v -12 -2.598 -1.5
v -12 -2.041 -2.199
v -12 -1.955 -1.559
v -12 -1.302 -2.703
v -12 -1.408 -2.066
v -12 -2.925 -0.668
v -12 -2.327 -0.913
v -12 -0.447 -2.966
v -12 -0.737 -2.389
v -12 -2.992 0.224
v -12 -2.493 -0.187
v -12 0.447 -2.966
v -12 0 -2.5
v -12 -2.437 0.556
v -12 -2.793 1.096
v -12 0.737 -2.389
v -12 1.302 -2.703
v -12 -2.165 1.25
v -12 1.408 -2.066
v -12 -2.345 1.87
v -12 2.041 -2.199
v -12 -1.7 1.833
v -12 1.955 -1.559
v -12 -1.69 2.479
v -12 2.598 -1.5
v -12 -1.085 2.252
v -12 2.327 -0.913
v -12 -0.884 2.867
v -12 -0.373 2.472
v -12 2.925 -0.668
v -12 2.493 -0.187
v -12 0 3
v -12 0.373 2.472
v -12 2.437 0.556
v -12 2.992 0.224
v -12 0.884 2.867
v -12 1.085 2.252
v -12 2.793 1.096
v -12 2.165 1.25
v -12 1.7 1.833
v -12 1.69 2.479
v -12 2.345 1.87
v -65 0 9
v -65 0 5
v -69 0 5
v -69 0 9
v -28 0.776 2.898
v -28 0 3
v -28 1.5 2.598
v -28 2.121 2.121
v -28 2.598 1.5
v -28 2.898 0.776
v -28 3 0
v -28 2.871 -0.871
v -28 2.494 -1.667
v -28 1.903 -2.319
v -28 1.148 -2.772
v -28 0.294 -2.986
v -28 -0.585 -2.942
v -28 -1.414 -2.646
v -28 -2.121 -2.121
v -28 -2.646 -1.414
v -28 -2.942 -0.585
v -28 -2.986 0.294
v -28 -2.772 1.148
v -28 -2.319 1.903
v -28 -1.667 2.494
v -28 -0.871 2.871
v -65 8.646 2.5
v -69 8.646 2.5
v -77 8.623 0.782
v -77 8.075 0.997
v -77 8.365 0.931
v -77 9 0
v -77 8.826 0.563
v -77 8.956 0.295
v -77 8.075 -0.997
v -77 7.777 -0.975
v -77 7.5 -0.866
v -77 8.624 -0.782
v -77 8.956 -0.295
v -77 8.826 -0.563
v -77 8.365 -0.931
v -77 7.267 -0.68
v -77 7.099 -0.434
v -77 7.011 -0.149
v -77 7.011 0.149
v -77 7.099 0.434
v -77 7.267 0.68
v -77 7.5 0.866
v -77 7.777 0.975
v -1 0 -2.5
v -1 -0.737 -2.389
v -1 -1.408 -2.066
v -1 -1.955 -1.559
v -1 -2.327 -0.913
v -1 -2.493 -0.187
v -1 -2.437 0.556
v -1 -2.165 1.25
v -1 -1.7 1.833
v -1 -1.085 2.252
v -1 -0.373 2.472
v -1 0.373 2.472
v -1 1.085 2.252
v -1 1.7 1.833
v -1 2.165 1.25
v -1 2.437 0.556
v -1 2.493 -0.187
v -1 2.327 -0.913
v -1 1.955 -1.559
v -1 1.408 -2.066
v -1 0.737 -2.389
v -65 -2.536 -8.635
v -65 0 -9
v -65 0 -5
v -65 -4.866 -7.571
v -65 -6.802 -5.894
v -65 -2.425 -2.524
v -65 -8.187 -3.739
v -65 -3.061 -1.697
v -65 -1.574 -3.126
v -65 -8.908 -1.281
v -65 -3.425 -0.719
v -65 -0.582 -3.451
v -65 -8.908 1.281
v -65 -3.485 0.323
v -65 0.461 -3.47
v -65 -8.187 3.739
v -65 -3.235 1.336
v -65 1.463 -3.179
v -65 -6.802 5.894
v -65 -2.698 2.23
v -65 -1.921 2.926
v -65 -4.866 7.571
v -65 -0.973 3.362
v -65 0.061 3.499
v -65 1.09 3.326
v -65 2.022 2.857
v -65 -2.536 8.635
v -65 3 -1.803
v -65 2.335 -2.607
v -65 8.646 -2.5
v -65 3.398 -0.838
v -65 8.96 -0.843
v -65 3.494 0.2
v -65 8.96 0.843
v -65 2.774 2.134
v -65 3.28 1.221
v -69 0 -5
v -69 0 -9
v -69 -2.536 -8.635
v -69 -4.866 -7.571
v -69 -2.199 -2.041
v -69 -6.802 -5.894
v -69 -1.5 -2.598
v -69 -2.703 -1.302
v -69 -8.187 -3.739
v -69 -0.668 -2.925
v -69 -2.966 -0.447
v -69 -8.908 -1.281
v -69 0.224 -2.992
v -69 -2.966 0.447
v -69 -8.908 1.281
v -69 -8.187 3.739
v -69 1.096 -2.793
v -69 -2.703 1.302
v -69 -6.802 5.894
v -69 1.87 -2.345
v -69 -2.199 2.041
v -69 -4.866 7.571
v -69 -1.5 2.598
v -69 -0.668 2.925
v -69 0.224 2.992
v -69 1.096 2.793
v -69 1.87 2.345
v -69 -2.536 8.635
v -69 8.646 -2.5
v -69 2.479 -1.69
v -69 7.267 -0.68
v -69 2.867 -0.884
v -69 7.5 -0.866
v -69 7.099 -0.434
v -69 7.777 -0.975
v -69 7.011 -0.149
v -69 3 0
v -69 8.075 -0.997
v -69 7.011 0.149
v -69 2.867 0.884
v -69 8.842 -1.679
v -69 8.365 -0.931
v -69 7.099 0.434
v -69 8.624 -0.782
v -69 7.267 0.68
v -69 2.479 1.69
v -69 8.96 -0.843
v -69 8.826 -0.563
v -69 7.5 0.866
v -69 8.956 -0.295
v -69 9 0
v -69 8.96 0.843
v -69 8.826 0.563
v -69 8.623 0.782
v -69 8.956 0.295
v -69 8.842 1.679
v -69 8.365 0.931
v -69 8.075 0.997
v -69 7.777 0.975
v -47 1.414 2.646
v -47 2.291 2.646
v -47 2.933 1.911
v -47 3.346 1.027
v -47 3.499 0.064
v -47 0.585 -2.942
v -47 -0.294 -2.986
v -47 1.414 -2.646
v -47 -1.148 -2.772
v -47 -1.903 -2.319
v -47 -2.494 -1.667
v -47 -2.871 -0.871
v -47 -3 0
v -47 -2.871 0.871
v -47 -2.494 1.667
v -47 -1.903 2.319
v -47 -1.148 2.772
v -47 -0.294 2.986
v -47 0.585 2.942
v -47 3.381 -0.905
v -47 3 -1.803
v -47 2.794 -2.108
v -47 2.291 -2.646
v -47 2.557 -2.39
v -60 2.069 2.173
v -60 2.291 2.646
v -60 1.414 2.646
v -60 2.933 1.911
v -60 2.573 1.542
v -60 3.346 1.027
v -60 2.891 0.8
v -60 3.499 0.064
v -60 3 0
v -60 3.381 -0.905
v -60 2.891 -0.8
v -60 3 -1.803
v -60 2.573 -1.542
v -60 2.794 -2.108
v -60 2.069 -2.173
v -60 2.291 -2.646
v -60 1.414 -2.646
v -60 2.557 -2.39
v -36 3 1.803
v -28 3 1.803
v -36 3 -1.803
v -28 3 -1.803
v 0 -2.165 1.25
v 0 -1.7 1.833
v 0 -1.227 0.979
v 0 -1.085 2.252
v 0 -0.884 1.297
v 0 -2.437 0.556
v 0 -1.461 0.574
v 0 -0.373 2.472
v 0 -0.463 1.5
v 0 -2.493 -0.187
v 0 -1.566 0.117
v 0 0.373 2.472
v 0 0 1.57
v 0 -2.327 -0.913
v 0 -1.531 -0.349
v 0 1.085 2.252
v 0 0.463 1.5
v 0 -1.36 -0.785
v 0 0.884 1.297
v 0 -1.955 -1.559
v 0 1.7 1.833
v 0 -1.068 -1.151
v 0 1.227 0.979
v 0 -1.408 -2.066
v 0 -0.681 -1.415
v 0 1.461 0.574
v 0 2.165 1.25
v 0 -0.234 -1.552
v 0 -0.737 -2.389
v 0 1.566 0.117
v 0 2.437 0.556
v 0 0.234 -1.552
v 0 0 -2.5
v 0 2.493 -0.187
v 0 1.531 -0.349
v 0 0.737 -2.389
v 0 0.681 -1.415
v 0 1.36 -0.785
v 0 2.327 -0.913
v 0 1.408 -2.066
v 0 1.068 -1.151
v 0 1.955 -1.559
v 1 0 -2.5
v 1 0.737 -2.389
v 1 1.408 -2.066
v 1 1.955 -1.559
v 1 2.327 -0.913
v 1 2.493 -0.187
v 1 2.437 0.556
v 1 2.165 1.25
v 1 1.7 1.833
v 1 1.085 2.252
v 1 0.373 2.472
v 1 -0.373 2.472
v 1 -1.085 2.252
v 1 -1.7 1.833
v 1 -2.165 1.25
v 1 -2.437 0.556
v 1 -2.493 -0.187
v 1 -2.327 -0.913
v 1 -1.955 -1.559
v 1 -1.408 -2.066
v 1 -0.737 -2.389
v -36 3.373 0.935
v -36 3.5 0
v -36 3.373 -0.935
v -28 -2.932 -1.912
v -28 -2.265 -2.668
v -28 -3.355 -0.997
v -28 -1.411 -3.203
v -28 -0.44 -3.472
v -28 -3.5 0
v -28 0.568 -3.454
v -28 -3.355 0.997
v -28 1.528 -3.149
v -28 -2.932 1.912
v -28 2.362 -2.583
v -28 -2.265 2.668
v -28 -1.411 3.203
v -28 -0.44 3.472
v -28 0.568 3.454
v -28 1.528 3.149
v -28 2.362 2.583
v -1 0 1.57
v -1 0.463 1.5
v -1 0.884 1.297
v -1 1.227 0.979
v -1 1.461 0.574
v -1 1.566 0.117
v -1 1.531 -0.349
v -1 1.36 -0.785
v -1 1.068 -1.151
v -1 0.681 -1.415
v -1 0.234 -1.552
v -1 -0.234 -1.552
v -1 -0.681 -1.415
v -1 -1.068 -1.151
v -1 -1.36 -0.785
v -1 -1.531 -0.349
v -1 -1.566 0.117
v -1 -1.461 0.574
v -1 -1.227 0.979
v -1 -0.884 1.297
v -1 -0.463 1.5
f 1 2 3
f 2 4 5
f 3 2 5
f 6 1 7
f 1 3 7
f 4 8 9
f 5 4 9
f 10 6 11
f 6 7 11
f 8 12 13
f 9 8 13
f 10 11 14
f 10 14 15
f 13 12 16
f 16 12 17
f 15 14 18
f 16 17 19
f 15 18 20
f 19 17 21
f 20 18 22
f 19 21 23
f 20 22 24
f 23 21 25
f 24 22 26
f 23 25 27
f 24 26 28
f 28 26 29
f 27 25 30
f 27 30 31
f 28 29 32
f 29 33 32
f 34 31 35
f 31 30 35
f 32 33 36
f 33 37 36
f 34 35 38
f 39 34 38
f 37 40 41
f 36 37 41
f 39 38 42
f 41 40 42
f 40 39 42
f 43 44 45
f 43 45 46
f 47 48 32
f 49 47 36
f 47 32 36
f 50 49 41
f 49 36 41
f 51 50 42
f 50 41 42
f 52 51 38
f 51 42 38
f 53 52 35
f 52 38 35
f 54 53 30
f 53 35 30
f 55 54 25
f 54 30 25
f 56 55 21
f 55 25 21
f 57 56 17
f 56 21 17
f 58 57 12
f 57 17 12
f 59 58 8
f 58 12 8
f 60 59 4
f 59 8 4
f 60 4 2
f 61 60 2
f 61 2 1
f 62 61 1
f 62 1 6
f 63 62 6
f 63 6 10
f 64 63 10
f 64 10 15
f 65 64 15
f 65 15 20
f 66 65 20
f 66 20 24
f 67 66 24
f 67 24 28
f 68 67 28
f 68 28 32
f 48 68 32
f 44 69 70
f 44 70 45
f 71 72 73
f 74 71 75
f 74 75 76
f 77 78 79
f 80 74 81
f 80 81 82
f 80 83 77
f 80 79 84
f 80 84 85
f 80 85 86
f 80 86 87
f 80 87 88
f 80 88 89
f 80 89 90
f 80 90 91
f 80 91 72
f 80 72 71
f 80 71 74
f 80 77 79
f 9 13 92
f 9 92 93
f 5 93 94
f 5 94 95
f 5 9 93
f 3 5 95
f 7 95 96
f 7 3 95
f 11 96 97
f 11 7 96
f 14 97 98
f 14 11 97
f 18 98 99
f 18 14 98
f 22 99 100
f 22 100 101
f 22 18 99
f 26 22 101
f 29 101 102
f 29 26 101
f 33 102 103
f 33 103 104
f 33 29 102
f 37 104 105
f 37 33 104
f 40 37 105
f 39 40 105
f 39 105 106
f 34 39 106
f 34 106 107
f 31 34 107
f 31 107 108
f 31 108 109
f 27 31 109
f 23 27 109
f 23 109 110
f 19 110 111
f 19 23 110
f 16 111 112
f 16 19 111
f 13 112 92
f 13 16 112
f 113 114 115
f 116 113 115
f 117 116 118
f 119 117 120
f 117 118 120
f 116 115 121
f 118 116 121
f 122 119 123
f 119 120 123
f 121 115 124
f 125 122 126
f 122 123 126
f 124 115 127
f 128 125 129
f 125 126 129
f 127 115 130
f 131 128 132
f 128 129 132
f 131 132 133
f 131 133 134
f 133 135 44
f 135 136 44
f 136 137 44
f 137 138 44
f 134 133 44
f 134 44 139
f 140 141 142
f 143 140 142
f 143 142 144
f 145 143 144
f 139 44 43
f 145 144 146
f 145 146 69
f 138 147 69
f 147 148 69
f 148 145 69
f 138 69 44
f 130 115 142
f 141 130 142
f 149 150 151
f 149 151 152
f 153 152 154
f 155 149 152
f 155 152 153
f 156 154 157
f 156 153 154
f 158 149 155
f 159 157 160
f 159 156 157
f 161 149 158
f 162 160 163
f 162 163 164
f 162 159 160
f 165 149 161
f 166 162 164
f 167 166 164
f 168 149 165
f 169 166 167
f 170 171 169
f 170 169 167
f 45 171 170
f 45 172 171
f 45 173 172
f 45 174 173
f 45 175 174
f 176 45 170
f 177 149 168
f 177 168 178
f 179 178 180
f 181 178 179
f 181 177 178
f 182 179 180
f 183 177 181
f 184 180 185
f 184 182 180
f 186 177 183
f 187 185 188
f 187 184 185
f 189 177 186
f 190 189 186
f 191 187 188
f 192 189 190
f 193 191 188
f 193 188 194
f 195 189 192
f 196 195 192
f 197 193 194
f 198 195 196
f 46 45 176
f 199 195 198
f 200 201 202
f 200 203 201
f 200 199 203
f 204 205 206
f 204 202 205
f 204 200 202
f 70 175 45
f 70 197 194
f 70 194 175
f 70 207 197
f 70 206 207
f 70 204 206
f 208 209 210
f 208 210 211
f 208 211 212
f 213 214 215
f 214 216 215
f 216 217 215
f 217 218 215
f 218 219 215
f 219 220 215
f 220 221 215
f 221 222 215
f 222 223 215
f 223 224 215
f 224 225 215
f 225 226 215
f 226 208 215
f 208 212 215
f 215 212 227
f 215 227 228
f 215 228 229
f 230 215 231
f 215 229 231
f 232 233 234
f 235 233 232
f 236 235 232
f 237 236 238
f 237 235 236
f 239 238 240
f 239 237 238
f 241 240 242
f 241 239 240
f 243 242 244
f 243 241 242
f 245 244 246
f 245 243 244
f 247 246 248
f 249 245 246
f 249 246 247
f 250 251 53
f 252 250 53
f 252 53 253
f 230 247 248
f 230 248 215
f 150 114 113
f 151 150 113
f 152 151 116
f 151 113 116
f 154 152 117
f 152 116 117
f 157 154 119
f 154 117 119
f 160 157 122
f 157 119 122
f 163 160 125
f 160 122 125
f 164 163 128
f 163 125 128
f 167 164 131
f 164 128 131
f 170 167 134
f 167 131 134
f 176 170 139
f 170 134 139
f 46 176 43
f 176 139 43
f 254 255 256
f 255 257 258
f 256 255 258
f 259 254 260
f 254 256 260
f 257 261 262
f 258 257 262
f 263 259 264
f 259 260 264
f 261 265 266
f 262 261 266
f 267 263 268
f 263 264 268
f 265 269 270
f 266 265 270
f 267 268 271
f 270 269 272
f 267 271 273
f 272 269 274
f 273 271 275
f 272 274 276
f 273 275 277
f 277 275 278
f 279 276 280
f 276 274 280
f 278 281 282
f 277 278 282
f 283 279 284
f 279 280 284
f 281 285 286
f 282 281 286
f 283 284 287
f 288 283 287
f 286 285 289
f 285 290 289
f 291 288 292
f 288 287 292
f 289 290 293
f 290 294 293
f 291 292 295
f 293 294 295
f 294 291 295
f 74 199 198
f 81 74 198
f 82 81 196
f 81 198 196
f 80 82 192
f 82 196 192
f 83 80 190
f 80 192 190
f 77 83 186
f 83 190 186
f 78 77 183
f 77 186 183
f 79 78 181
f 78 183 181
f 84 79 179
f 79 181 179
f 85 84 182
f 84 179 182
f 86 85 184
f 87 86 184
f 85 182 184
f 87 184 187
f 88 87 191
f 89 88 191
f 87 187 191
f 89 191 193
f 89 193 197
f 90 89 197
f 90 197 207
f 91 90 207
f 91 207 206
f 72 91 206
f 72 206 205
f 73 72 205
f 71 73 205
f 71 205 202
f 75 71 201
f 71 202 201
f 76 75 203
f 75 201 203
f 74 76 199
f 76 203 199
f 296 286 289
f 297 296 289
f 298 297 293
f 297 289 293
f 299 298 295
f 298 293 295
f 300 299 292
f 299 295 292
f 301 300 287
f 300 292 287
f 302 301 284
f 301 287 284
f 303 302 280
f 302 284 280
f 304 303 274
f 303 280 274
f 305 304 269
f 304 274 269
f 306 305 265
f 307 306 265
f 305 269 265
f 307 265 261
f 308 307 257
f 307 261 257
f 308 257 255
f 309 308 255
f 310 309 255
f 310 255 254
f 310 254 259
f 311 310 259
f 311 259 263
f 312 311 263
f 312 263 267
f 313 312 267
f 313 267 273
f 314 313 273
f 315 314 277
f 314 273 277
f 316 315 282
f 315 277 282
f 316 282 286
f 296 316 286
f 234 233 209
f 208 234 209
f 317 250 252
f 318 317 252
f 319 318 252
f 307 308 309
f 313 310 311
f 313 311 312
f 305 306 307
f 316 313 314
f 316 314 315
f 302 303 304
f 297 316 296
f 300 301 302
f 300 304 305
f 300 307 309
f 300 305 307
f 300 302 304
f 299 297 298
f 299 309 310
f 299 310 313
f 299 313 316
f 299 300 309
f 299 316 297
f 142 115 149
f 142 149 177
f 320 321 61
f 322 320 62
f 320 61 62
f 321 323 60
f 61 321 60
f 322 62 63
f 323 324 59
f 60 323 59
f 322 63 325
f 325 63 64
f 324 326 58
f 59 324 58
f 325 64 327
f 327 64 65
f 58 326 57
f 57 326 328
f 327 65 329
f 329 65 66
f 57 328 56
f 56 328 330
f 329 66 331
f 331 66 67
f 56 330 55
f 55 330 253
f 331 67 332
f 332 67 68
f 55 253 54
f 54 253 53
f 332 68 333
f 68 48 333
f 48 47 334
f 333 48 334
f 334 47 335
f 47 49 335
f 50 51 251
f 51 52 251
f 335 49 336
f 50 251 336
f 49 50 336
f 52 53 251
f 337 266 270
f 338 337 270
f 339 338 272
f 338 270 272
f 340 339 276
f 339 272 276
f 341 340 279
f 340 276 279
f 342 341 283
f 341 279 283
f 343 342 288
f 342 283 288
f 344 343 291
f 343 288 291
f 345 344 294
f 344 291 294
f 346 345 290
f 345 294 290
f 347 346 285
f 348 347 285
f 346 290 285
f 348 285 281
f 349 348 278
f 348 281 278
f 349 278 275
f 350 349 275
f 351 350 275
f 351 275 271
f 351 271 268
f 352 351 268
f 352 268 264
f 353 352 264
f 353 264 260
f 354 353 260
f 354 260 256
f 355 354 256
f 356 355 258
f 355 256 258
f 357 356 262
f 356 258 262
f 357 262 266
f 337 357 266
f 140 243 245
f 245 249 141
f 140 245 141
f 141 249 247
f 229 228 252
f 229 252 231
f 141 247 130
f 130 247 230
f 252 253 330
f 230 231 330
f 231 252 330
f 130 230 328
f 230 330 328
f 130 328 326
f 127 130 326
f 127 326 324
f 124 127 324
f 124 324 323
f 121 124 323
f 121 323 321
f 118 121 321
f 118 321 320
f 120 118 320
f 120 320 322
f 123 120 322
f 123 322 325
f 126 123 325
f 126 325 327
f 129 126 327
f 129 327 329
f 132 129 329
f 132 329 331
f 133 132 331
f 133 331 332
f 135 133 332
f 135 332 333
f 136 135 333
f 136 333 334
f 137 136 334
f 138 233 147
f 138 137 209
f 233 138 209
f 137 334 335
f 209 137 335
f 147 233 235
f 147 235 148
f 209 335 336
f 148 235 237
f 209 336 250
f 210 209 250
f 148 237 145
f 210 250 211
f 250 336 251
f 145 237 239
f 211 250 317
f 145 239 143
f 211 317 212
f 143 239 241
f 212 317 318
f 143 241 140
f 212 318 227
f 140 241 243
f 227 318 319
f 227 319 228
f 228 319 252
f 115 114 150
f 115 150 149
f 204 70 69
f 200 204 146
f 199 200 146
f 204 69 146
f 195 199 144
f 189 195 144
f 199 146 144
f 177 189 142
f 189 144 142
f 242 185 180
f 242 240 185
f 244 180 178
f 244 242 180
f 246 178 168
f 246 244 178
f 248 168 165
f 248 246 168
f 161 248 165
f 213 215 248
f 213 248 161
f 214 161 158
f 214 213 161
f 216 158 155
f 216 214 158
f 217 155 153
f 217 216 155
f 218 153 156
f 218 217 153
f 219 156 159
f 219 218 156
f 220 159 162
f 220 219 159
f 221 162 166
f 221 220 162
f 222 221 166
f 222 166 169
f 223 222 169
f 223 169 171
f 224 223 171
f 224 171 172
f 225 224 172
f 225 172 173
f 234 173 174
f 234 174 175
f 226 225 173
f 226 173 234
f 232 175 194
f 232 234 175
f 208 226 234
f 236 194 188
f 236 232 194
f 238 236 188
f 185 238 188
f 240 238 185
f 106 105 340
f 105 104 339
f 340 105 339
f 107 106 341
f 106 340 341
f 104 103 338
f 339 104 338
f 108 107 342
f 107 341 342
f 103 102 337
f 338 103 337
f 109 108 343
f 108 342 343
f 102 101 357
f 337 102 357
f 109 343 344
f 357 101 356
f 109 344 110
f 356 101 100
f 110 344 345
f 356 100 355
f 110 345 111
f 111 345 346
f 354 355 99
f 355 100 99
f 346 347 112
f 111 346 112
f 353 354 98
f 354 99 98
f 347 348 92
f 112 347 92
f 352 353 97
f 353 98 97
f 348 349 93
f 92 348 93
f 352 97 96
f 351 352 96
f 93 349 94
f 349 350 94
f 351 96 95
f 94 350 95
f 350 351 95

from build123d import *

# Parameters (mm, degrees)
SKETCH1_R           = 2.5
BOSS_EXTRUDE1_DEPTH = 1
SKETCH2_R           = 1.57
BOSS_EXTRUDE2_DEPTH = 1
BOSS_EXTRUDE3_START = 11
SKETCH3_R           = 2.5
BOSS_EXTRUDE3_DEPTH = 11
SKETCH4_R           = 3
BOSS_EXTRUDE4_DEPTH = 16
SKETCH6_R           = 3.5
BOSS_EXTRUDE6_DEPTH = 8
SKETCH7_W           = 8.052083516
SKETCH7_H           = 1.294876405
CUT_EXTRUDE1_DEPTH  = 30.419381367
SKETCH8_R           = 3.5
BOSS_EXTRUDE7_DEPTH = 29
CUT_EXTRUDE2_START  = -18
SKETCH9_R           = 3
CUT_EXTRUDE2_DEPTH  = 18
SKETCH10_W          = 13
SKETCH10_H          = 5.291502622
CUT_EXTRUDE3_DEPTH  = 3
SKETCH11_R          = 9
BOSS_EXTRUDE8_DEPTH = 4
CUT_EXTRUDE4_START  = -4
SKETCH12_R          = 3
CUT_EXTRUDE4_DEPTH  = 4
CUT_EXTRUDE5_START  = -4
CUT_EXTRUDE5_DEPTH  = 4
SKETCH14_R          = 1
BOSS_EXTRUDE9_DEPTH = 8


with BuildPart() as part:
    # Sketch1 → Boss-Extrude1 (new body)
    with BuildSketch(Plane(origin=(0, 0, 0), x_dir=(0, 0, -1), z_dir=(1, 0, 0))):
        Circle(SKETCH1_R)
    extrude(amount=BOSS_EXTRUDE1_DEPTH)

    # Sketch2 → Boss-Extrude2 (add)
    with BuildSketch(Plane.ZY):
        Circle(SKETCH2_R)
    extrude(amount=BOSS_EXTRUDE2_DEPTH)

    # Sketch3 → Boss-Extrude3 (add)
    with BuildSketch(Plane.ZY.offset(1).offset(BOSS_EXTRUDE3_START)):
        with Locations(Location((0, 0, 0), (0, 0, 180))):
            Circle(SKETCH3_R)
    extrude(amount=-BOSS_EXTRUDE3_DEPTH)

    # Sketch4 → Boss-Extrude4 (add)
    with BuildSketch(Plane.ZY.offset(12)):
        Circle(SKETCH4_R)
    extrude(amount=BOSS_EXTRUDE4_DEPTH)

    # Sketch6 → Boss-Extrude6 (add)
    with BuildSketch(Plane.ZY.offset(28)):
        Circle(SKETCH6_R)
    extrude(amount=BOSS_EXTRUDE6_DEPTH)

    # Sketch7 → Cut-Extrude1 (cut, through all)
    with BuildSketch(Plane(origin=(-28, 0, 0), x_dir=(0, 0, -1), z_dir=(1, 0, 0))):
        with Locations((-0.074496348, 3.647438203)):
            Rectangle(SKETCH7_W, SKETCH7_H)
    extrude(amount=-CUT_EXTRUDE1_DEPTH, mode=Mode.SUBTRACT)

    # Sketch8 → Boss-Extrude7 (add)
    with BuildSketch(Plane.ZY.offset(36)):
        with Locations(Location((0, 0, 0), (0, 0, 121.002719134))):
            Circle(SKETCH8_R)
    extrude(amount=BOSS_EXTRUDE7_DEPTH)

    # Sketch9 → Cut-Extrude2 (cut)
    with BuildSketch(Plane.ZY.offset(65).offset(CUT_EXTRUDE2_START)):
        with Locations(Location((0, 0, 0), (0, 0, 90))):
            Circle(SKETCH9_R)
    extrude(amount=CUT_EXTRUDE2_DEPTH, mode=Mode.SUBTRACT)

    # Sketch10 → Cut-Extrude3 (cut)
    with BuildSketch(Plane(origin=(0, 4, 0), x_dir=(1, 0, 0), z_dir=(0, 1, 0))):
        with Locations((-53.5, 0)):
            Rectangle(SKETCH10_W, SKETCH10_H)
    extrude(amount=-CUT_EXTRUDE3_DEPTH, mode=Mode.SUBTRACT)

    # Sketch11 → Boss-Extrude8 (add)
    with BuildSketch(Plane.ZY.offset(65)):
        Circle(SKETCH11_R)
    extrude(amount=BOSS_EXTRUDE8_DEPTH)

    # Sketch12 → Cut-Extrude4 (cut)
    with BuildSketch(Plane.ZY.offset(69).offset(CUT_EXTRUDE4_START)):
        with Locations(Location((0, 0, 0), (0, 0, 90))):
            Circle(SKETCH12_R)
    extrude(amount=CUT_EXTRUDE4_DEPTH, mode=Mode.SUBTRACT)

    # Sketch13 → Cut-Extrude5 (cut)
    with BuildSketch(Plane.ZY.offset(69).offset(CUT_EXTRUDE5_START)):
        with BuildLine():
            ThreePointArc((-2.5, 8.645808233), (-7.193747285, 5.408326913), (-9, 0))
            Line((-9, 0), (-5, 0))
            Line((-5, 0), (-2.5, 8.645808233))
        make_face()
        with BuildLine():
            Line((5, 0), (9, 0))
            ThreePointArc((9, 0), (7.193747285, 5.408326913), (2.5, 8.645808233))
            Line((2.5, 8.645808233), (5, 0))
        make_face()
    extrude(amount=CUT_EXTRUDE5_DEPTH, mode=Mode.SUBTRACT)

    # Sketch14 → Boss-Extrude9 (add)
    with BuildSketch(Plane.ZY.offset(69)):
        with Locations(Location((0, 8, 0), (0, 0, 89.999140318))):
            Circle(SKETCH14_R)
    extrude(amount=BOSS_EXTRUDE9_DEPTH)


solid = part.part
